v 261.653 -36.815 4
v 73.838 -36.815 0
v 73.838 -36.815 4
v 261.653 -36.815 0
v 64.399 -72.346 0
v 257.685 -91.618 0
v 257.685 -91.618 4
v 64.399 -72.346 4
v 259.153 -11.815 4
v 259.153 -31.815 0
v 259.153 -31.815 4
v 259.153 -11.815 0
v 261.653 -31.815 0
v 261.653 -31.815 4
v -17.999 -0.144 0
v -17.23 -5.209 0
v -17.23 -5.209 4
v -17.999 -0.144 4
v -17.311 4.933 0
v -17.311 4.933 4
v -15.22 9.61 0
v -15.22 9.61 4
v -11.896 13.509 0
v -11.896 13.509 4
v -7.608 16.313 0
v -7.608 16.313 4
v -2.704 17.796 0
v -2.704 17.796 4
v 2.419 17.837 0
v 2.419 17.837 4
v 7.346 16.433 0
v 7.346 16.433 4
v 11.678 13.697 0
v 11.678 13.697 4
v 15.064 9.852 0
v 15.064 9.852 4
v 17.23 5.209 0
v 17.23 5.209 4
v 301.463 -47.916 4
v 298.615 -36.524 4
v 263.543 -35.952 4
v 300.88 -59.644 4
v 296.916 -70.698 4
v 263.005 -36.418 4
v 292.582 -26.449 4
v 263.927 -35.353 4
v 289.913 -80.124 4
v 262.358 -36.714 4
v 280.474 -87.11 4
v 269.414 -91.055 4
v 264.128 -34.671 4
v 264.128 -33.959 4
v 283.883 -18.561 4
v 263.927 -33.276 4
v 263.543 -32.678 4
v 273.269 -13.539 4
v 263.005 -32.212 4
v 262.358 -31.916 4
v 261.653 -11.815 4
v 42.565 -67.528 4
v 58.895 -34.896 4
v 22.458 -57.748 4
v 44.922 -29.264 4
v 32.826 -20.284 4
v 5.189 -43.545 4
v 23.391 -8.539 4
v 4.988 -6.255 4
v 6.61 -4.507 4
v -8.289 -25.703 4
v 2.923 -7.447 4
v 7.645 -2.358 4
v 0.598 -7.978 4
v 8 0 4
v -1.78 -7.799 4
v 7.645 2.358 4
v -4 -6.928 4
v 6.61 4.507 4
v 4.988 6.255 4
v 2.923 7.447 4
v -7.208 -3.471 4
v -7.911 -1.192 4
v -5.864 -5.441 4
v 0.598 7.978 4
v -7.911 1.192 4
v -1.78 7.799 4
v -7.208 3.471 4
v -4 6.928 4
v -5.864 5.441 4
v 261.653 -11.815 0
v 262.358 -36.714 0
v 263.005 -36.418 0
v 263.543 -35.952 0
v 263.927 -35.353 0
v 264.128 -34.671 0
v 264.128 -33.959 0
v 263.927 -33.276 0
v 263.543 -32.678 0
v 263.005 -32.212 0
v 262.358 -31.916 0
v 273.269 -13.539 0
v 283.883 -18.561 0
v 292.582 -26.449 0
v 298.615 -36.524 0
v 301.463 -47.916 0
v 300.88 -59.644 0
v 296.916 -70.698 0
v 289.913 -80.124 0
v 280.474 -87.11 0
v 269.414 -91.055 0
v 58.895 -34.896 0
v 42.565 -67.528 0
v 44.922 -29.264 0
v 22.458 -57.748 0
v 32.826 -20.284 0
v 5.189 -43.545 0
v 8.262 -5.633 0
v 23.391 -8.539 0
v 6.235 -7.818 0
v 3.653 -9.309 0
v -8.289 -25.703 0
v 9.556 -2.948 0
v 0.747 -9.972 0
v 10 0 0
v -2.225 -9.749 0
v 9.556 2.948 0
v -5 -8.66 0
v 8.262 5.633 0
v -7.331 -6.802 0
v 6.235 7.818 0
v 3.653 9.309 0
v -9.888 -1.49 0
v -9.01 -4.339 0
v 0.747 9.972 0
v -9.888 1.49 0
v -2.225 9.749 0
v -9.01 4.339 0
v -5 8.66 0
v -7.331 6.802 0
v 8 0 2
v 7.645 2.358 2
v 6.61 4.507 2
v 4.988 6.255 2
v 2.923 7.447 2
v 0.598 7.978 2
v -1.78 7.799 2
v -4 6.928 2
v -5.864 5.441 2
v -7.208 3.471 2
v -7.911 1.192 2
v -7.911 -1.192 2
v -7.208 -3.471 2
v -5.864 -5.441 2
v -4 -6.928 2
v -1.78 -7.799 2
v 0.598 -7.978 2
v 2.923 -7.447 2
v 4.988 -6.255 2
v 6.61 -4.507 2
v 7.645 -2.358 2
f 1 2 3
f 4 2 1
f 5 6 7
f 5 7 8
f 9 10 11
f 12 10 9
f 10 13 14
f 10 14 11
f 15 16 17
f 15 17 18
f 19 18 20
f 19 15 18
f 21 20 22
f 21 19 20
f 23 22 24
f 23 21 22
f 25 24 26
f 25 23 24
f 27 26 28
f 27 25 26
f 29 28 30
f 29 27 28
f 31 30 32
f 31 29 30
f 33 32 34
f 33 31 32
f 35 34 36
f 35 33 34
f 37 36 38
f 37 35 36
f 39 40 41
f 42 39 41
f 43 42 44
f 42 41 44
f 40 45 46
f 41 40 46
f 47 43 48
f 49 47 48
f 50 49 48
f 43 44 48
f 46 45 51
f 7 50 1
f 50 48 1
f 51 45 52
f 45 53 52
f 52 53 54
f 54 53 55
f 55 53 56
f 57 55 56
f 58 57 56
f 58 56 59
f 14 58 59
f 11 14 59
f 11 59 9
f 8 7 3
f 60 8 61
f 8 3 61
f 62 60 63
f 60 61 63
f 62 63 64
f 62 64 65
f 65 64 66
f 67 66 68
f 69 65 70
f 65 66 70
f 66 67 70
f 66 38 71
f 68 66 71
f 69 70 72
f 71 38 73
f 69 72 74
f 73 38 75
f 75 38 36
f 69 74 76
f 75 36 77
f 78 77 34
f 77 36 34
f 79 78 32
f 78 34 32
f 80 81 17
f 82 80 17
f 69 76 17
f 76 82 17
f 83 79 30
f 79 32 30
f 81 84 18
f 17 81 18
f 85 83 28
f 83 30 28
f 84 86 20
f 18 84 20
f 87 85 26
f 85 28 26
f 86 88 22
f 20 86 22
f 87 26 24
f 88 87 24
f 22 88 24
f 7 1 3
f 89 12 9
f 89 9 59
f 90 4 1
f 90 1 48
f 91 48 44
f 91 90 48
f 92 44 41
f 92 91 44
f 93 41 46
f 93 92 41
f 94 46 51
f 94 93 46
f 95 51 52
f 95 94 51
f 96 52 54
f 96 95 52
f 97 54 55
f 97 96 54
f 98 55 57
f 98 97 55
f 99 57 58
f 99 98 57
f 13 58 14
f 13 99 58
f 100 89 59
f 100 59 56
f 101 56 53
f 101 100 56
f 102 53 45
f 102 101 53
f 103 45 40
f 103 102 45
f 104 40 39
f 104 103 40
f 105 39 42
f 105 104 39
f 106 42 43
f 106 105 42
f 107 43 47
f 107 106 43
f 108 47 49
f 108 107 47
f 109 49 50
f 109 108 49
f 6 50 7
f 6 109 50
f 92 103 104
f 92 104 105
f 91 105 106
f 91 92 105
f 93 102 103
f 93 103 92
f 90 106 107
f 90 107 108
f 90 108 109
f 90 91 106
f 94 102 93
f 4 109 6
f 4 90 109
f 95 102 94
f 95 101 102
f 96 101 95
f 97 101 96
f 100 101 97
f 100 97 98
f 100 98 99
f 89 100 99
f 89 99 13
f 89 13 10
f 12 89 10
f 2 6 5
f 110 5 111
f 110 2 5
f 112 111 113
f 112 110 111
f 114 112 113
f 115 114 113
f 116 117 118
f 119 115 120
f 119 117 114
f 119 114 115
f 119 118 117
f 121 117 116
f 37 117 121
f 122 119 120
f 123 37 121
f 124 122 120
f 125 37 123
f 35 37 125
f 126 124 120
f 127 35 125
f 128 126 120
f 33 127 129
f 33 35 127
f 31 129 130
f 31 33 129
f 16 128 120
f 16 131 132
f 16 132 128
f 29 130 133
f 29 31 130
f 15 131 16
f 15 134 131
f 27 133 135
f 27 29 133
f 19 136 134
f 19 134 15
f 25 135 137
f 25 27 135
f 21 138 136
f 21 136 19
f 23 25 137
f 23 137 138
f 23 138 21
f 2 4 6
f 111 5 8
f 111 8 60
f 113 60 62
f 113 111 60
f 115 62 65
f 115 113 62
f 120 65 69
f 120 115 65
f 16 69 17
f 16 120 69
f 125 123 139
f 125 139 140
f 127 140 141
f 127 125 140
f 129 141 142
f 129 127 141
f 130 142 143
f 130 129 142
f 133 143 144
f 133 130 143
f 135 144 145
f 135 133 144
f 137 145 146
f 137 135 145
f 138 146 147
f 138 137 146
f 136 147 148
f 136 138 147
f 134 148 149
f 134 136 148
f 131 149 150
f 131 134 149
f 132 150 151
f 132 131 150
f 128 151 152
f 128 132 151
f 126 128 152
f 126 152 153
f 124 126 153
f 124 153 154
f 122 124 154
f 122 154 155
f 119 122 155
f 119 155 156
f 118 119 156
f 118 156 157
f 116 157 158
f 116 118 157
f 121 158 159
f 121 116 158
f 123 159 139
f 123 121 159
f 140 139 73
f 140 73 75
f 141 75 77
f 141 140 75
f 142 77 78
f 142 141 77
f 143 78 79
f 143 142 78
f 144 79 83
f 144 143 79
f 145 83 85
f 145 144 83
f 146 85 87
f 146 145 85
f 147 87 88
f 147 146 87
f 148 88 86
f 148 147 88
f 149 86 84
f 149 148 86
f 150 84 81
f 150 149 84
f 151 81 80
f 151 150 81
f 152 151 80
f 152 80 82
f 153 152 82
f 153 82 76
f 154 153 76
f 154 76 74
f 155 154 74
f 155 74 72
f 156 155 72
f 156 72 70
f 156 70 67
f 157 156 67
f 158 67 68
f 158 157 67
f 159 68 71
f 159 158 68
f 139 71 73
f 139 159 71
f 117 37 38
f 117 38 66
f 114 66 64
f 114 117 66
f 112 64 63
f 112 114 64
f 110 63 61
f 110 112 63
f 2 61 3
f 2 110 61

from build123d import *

# Parameters (mm, degrees)
SKETCH_1_R             = 8
SM_BASE_FLANGE_1_DEPTH = 4
CHAMFER_2_SIZE         = 2


# Sheet-metal steps are written as plain solids
with BuildPart() as part:
    # Sketch 1 → Базовая кромка1 (new body)
    with BuildSketch(Plane.XY):
        with BuildLine():
            Line((259.153254995, -11.814954576), (261.653254995, -11.814954576))
            ThreePointArc((261.653254995, -11.814954576), (301.603884083, -53.801719646), (257.684629276, -91.617592804))
            Line((257.684629276, -91.617592804), (64.398882219, -72.345533941))
            ThreePointArc((64.398882219, -72.345533941), (13.404361157, -51.155129463), (-17.229741187, -5.209224379))
            ThreePointArc((-17.229741187, -5.209224379), (-5.209224379, 17.229741187), (17.229741187, 5.209224379))
            ThreePointArc((17.229741187, 5.209224379), (38.587121714, -25.160558799), (73.838171235, -36.814954576))
            Line((73.838171235, -36.814954576), (261.653254995, -36.814954576))
            ThreePointArc((261.653254995, -36.814954576), (264.153254995, -34.314954576), (261.653254995, -31.814954576))
            Line((261.653254995, -31.814954576), (259.153254995, -31.814954576))
            Line((259.153254995, -31.814954576), (259.153254995, -11.814954576))
        make_face()
        Circle(SKETCH_1_R, mode=Mode.SUBTRACT)
    extrude(amount=SM_BASE_FLANGE_1_DEPTH)

    # Фаска2
    chamfer_2_edges = [part.edges().sort_by_distance(p)[0] for p in [
        (-8, 0, 0),
    ]]
    chamfer(chamfer_2_edges, length=CHAMFER_2_SIZE)


solid = part.part
